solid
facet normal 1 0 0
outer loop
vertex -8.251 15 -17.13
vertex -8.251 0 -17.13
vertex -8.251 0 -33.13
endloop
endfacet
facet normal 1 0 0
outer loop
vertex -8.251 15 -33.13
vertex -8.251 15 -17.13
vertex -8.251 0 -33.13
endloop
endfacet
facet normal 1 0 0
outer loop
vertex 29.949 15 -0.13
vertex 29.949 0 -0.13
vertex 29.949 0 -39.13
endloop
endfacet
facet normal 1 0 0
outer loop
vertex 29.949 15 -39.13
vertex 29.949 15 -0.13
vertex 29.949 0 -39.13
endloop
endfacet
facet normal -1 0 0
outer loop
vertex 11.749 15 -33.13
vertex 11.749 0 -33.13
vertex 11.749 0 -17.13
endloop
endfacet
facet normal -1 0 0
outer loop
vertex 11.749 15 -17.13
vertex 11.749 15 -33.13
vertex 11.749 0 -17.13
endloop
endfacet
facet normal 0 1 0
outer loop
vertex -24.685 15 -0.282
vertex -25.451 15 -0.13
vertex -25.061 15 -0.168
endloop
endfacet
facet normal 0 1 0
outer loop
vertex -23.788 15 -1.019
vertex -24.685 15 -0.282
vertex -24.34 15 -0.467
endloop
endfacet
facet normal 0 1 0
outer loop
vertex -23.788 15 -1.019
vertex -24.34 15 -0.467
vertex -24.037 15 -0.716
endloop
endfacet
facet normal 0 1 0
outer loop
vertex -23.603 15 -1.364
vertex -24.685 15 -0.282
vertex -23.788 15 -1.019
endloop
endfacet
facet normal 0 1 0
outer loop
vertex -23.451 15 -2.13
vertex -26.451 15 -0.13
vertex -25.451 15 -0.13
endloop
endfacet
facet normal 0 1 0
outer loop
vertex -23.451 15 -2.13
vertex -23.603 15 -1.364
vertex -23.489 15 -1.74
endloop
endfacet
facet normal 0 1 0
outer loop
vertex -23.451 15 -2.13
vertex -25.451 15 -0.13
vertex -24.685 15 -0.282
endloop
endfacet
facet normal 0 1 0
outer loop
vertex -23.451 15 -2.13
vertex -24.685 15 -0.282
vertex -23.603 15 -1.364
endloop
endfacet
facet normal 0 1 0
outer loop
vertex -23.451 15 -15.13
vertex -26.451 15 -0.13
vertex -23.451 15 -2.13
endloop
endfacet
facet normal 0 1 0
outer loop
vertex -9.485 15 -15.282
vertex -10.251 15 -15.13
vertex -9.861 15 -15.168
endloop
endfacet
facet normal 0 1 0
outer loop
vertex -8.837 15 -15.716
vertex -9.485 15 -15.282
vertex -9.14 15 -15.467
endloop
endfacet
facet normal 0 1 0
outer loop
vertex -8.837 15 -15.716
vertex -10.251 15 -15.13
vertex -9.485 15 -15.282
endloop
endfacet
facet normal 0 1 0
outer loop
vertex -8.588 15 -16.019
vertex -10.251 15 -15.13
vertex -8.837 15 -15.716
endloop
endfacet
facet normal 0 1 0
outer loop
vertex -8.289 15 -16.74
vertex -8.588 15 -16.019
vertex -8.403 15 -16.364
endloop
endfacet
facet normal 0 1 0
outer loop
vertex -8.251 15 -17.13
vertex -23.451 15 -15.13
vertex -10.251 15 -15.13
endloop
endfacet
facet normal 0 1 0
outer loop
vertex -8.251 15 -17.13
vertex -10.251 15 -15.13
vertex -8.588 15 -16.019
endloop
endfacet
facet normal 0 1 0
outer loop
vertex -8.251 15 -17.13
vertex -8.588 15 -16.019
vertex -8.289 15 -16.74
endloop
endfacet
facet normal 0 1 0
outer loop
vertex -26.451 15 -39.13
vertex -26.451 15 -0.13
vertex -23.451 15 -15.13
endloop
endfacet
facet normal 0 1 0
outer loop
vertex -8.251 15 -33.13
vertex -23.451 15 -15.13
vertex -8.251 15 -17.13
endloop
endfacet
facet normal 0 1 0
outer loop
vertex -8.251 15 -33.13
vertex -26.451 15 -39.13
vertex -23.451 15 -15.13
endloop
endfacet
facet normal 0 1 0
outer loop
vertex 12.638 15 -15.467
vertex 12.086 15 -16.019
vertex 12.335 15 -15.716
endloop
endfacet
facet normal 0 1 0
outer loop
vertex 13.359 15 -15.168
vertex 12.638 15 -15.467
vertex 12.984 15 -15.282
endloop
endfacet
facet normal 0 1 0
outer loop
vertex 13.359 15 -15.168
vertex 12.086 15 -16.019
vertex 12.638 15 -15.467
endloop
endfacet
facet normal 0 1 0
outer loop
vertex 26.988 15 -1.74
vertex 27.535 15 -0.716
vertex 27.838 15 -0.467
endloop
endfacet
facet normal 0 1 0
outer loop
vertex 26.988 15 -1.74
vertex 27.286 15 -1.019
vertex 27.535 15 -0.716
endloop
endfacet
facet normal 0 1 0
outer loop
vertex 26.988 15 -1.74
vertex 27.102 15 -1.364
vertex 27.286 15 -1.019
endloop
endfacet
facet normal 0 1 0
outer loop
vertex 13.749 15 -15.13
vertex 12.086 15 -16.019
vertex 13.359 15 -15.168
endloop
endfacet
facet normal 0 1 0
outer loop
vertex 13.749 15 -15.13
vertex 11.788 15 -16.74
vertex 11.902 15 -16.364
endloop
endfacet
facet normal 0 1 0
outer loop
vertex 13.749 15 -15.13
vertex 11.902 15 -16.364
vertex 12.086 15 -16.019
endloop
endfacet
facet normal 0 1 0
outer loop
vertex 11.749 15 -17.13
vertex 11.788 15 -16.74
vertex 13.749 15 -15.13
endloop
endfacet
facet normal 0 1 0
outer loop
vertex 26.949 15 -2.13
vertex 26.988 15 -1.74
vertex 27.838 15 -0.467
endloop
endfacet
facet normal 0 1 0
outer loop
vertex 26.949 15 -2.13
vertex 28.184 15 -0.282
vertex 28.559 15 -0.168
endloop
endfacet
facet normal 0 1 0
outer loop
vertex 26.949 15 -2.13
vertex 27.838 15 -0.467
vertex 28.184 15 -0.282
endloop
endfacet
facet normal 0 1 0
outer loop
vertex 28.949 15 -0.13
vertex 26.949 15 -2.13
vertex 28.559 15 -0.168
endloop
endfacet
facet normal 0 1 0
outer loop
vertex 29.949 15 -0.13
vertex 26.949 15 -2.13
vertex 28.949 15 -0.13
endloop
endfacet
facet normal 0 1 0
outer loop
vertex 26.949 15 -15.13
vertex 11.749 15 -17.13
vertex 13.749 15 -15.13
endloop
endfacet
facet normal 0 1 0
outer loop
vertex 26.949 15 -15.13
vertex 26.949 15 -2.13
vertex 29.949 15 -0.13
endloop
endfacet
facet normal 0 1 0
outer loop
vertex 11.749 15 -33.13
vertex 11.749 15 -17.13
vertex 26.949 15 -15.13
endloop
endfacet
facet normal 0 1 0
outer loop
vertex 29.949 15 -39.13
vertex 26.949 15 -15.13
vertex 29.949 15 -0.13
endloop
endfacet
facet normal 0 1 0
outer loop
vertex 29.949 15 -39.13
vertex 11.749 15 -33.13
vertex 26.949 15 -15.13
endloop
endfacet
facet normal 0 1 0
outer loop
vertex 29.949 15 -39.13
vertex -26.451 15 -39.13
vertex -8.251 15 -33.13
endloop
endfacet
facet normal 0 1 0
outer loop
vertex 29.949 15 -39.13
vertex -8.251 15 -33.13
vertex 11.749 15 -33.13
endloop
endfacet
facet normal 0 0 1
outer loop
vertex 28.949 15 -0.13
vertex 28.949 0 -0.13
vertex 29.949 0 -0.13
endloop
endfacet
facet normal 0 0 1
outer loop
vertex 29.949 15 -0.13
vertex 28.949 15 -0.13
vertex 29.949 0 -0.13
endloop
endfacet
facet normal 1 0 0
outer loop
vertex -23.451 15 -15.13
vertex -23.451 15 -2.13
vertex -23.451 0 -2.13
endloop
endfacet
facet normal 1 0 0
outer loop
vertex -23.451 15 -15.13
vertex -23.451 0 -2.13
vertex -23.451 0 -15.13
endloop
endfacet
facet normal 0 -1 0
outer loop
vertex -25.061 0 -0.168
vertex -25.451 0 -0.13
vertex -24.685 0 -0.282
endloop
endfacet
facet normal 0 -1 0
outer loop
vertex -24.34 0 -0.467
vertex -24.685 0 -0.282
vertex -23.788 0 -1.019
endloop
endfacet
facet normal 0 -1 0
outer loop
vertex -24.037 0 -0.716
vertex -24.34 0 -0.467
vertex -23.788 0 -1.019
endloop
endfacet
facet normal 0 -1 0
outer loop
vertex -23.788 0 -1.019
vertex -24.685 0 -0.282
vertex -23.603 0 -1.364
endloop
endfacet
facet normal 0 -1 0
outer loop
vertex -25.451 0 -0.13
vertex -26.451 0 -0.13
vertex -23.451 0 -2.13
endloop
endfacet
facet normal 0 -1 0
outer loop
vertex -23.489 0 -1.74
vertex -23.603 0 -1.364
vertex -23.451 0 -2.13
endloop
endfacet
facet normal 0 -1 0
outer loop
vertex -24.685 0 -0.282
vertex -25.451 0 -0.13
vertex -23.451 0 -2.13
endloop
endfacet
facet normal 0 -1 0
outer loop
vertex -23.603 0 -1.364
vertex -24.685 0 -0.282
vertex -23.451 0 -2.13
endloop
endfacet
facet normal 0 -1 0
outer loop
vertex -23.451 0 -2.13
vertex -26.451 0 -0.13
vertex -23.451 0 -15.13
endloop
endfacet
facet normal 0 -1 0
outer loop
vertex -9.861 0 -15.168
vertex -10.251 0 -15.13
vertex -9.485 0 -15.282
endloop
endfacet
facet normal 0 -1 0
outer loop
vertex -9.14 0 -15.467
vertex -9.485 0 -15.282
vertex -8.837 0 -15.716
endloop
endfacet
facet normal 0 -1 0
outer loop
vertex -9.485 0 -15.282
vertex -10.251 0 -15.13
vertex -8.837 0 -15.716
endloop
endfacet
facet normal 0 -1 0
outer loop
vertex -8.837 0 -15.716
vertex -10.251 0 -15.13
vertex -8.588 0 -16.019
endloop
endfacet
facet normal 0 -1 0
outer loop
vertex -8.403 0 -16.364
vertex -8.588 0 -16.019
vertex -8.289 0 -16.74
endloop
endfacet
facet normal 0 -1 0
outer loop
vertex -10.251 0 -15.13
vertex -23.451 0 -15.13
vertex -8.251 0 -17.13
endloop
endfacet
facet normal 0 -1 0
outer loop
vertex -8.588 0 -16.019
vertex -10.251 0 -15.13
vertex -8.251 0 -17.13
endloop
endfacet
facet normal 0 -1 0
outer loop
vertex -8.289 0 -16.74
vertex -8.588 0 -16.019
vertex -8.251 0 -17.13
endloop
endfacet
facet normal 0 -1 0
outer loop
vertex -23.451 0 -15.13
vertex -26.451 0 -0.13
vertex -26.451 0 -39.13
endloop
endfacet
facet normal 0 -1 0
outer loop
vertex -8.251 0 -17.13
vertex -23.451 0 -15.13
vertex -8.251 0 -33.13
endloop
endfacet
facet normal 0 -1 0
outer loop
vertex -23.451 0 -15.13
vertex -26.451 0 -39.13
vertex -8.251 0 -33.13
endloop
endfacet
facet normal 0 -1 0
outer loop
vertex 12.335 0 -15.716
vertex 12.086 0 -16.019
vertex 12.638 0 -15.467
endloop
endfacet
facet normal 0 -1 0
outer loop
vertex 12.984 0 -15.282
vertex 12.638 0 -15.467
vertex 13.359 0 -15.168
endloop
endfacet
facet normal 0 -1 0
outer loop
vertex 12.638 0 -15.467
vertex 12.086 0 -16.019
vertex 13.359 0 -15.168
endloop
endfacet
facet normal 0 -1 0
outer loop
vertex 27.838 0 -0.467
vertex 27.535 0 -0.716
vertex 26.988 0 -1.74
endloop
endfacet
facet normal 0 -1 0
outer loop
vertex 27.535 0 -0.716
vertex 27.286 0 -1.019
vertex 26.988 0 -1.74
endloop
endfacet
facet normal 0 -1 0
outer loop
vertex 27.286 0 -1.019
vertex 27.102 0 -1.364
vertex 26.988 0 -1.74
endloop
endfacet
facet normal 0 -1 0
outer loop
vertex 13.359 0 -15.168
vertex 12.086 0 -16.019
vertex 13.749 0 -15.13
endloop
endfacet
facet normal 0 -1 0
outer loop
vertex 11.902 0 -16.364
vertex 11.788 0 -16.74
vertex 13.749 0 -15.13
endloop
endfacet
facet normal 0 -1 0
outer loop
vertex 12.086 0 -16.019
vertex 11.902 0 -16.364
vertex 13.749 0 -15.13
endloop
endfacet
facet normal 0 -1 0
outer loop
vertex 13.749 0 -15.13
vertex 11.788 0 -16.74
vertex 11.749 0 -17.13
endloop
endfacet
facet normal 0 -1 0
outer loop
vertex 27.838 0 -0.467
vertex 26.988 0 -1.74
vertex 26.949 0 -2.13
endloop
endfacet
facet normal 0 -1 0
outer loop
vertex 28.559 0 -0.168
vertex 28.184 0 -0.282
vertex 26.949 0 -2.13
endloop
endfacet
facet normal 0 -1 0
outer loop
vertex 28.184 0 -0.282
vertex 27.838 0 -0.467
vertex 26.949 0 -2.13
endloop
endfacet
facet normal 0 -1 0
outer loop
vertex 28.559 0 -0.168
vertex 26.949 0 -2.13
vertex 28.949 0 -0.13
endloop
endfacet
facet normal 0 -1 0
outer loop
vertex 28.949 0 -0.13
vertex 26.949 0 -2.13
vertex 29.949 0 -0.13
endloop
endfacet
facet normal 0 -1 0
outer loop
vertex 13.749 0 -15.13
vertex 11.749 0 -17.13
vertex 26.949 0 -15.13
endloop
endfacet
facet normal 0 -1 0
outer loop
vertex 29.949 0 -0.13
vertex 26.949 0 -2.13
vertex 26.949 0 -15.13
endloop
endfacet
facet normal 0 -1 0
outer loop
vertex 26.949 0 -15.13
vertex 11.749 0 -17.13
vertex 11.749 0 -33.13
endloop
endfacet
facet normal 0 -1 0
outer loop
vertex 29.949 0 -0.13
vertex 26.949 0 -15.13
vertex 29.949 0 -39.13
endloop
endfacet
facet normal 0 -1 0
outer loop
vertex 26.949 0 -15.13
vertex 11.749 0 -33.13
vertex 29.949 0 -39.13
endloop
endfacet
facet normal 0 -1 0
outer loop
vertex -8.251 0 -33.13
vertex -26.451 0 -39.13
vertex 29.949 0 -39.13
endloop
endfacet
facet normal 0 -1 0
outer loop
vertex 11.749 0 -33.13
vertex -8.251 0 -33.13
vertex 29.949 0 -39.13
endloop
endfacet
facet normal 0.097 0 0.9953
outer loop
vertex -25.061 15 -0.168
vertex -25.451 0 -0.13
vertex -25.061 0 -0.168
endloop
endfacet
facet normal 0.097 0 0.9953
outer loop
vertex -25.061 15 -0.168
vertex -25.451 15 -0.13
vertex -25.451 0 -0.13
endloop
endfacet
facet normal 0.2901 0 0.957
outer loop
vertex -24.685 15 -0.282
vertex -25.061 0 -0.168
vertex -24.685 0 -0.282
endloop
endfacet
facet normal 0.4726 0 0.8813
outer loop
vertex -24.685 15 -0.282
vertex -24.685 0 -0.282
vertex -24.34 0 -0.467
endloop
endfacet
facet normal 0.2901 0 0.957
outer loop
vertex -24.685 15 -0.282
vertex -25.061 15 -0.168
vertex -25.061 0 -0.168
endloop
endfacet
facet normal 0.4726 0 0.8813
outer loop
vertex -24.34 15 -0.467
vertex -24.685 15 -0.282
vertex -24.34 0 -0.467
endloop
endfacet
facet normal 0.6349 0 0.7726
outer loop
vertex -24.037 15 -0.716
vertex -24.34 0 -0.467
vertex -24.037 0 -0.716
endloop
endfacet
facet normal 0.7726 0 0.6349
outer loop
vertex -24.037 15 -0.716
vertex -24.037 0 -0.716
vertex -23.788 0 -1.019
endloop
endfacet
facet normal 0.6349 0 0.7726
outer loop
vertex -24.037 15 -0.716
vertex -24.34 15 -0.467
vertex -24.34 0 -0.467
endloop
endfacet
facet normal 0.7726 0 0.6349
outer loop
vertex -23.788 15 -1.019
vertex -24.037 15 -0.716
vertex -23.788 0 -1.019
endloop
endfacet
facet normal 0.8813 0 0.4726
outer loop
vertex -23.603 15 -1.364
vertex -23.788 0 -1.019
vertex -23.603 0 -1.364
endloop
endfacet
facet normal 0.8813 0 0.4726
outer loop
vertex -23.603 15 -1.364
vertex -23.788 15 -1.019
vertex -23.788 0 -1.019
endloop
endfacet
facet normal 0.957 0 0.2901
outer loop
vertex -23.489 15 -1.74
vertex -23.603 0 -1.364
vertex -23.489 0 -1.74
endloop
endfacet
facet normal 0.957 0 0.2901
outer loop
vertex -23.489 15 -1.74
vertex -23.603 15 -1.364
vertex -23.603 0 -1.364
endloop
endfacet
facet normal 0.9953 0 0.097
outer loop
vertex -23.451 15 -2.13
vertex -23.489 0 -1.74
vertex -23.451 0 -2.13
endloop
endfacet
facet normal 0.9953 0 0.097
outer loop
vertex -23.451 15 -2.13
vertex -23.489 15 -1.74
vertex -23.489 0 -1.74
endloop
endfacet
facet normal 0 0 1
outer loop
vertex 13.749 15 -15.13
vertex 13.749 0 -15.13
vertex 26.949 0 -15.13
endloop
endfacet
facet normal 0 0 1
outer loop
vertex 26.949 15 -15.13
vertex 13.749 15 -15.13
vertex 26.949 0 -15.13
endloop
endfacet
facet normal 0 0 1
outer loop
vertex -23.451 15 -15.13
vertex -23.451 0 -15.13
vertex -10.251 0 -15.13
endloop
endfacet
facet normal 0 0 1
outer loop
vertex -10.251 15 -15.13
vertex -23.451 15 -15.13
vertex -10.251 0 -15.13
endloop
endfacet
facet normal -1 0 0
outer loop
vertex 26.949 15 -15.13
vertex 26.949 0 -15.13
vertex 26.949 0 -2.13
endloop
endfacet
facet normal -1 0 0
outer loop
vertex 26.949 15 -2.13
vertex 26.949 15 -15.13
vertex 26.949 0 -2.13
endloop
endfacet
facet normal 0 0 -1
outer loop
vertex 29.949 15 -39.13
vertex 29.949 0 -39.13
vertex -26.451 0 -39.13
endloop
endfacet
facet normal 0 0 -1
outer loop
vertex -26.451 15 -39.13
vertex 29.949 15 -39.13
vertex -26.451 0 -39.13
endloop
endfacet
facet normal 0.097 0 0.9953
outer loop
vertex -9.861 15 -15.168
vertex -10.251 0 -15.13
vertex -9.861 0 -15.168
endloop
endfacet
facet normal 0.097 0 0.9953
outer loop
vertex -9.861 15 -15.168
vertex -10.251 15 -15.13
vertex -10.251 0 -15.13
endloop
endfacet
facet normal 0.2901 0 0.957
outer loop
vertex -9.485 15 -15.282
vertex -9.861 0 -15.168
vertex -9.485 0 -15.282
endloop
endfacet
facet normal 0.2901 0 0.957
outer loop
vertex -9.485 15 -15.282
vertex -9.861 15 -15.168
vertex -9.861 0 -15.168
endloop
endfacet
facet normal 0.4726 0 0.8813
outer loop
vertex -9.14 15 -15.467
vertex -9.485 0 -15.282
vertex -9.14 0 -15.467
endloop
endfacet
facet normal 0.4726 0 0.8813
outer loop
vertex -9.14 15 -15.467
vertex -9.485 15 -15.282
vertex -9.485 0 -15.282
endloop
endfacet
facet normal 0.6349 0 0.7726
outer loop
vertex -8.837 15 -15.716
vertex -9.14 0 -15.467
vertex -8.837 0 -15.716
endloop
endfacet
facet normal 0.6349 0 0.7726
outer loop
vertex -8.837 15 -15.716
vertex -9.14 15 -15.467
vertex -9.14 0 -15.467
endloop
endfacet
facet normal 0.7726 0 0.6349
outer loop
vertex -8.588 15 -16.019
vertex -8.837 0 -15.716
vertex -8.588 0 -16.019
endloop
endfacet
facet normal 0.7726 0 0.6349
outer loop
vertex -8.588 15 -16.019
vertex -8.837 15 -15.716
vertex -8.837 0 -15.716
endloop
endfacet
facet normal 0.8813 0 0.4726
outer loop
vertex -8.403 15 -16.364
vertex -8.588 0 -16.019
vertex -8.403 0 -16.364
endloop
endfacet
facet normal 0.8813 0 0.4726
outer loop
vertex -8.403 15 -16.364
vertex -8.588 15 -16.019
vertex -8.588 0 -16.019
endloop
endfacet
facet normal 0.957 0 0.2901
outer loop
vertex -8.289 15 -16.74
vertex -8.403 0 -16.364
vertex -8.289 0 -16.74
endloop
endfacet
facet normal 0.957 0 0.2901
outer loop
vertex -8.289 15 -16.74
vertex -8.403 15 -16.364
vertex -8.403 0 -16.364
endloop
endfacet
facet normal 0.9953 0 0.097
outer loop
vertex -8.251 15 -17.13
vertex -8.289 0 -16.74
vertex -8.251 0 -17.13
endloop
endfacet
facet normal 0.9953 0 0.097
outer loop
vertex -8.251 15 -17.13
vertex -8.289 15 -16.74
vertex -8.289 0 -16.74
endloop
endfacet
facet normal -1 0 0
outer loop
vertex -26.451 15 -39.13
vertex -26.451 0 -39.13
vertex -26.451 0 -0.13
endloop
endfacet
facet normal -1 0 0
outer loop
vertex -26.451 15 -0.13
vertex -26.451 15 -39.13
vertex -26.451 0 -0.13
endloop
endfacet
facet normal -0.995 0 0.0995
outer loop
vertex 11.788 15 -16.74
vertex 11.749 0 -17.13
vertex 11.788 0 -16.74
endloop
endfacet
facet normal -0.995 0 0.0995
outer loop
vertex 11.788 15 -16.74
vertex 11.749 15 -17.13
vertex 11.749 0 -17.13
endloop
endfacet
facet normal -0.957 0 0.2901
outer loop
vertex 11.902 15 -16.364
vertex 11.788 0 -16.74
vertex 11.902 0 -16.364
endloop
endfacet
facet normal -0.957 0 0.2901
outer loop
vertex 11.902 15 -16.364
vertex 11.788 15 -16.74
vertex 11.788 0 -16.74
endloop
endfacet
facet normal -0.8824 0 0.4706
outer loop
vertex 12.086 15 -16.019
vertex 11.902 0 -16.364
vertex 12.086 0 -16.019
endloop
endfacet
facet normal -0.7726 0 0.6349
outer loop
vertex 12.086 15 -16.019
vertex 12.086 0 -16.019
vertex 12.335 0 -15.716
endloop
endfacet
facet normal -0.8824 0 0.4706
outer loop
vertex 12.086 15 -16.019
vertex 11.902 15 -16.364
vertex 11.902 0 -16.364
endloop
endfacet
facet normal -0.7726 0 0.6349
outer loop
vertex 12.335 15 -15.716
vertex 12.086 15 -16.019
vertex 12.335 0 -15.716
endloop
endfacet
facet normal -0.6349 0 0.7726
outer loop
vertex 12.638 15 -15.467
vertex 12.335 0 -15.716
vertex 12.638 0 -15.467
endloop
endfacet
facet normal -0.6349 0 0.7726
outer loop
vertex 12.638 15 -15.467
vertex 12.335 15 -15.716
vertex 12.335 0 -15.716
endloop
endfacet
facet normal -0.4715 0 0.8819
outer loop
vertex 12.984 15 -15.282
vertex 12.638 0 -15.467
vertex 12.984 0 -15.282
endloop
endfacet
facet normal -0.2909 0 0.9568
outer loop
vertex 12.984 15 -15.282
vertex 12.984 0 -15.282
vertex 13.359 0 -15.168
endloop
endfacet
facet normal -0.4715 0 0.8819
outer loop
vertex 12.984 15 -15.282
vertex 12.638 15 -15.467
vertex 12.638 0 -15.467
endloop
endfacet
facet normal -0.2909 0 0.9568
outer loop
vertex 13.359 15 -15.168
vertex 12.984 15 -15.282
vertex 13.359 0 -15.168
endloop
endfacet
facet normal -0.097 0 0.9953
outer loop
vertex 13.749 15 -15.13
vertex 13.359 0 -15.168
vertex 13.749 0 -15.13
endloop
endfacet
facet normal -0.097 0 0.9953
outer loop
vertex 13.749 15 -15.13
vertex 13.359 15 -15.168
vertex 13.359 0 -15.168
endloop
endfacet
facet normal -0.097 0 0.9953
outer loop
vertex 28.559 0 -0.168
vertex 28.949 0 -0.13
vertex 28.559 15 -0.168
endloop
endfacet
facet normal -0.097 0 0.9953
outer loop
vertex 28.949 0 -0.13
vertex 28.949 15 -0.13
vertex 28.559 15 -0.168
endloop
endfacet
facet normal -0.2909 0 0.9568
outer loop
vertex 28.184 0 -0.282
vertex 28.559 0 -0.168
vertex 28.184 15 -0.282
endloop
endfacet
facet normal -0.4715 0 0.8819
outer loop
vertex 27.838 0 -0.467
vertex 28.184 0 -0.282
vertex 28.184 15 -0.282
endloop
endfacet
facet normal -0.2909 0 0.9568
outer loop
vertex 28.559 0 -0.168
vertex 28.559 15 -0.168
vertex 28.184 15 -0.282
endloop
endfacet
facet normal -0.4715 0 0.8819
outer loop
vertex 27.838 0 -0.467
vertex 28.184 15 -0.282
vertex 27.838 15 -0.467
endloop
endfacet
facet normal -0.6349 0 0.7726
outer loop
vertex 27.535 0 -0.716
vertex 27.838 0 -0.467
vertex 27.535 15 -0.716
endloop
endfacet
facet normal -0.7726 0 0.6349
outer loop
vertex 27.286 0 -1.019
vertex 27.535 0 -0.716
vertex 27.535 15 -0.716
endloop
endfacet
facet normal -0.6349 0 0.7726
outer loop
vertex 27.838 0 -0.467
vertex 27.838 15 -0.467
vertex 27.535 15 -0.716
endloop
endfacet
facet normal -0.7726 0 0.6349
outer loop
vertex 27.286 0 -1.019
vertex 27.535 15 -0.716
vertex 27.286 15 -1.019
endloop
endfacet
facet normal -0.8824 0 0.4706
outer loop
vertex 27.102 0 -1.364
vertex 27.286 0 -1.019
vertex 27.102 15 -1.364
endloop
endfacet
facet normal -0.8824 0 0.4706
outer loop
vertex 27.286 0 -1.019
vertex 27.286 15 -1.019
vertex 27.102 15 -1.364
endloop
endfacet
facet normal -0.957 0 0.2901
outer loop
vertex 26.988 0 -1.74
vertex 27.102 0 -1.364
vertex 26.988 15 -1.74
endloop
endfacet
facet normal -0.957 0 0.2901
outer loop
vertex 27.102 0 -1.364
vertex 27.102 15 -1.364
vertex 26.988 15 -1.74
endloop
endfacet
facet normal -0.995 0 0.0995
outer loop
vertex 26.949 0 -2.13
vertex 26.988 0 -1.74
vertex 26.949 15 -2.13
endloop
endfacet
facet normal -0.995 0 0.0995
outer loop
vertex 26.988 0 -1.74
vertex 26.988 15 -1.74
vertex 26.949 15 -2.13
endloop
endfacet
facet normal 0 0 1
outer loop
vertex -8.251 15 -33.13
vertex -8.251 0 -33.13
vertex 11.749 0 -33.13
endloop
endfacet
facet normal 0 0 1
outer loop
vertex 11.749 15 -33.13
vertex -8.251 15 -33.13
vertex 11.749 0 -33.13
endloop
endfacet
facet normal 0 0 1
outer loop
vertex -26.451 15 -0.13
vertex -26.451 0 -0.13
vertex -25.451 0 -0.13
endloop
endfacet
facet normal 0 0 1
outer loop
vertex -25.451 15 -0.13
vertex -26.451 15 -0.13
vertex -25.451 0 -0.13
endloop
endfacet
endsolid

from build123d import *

# Parameters (mm, degrees)
BOSS_EXTRUDE1_DEPTH = 15
FILLET2_R           = 2


with BuildPart() as part:
    # Sketch1 → Boss-Extrude1 (new body)
    with BuildSketch(Plane(origin=(0, 0, 0), x_dir=(1, 0, 0), z_dir=(0, 1, 0))):
        Polygon((26.949275536, 0.12972973), (29.949275536, 0.12972973), (29.949275536, 39.12972973), (-26.450724464, 39.12972973), (-26.450724464, 0.12972973), (-23.450724464, 0.12972973), (-23.450724464, 15.12972973), (-8.250724464, 15.12972973), (-8.250724464, 33.12972973), (11.749275536, 33.12972973), (11.749275536, 15.12972973), (26.949275536, 15.12972973), align=None)
    extrude(amount=BOSS_EXTRUDE1_DEPTH)

    # Fillet2
    fillet2_edges = [part.edges().sort_by_distance(p)[0] for p in [
        (26.949275536, 7.5, -0.12972973),
        (11.749275536, 7.5, -15.12972973),
        (-8.250724464, 7.5, -15.12972973),
        (-23.450724464, 7.5, -0.12972973),
    ]]
    fillet(fillet2_edges, radius=FILLET2_R)


solid = part.part
